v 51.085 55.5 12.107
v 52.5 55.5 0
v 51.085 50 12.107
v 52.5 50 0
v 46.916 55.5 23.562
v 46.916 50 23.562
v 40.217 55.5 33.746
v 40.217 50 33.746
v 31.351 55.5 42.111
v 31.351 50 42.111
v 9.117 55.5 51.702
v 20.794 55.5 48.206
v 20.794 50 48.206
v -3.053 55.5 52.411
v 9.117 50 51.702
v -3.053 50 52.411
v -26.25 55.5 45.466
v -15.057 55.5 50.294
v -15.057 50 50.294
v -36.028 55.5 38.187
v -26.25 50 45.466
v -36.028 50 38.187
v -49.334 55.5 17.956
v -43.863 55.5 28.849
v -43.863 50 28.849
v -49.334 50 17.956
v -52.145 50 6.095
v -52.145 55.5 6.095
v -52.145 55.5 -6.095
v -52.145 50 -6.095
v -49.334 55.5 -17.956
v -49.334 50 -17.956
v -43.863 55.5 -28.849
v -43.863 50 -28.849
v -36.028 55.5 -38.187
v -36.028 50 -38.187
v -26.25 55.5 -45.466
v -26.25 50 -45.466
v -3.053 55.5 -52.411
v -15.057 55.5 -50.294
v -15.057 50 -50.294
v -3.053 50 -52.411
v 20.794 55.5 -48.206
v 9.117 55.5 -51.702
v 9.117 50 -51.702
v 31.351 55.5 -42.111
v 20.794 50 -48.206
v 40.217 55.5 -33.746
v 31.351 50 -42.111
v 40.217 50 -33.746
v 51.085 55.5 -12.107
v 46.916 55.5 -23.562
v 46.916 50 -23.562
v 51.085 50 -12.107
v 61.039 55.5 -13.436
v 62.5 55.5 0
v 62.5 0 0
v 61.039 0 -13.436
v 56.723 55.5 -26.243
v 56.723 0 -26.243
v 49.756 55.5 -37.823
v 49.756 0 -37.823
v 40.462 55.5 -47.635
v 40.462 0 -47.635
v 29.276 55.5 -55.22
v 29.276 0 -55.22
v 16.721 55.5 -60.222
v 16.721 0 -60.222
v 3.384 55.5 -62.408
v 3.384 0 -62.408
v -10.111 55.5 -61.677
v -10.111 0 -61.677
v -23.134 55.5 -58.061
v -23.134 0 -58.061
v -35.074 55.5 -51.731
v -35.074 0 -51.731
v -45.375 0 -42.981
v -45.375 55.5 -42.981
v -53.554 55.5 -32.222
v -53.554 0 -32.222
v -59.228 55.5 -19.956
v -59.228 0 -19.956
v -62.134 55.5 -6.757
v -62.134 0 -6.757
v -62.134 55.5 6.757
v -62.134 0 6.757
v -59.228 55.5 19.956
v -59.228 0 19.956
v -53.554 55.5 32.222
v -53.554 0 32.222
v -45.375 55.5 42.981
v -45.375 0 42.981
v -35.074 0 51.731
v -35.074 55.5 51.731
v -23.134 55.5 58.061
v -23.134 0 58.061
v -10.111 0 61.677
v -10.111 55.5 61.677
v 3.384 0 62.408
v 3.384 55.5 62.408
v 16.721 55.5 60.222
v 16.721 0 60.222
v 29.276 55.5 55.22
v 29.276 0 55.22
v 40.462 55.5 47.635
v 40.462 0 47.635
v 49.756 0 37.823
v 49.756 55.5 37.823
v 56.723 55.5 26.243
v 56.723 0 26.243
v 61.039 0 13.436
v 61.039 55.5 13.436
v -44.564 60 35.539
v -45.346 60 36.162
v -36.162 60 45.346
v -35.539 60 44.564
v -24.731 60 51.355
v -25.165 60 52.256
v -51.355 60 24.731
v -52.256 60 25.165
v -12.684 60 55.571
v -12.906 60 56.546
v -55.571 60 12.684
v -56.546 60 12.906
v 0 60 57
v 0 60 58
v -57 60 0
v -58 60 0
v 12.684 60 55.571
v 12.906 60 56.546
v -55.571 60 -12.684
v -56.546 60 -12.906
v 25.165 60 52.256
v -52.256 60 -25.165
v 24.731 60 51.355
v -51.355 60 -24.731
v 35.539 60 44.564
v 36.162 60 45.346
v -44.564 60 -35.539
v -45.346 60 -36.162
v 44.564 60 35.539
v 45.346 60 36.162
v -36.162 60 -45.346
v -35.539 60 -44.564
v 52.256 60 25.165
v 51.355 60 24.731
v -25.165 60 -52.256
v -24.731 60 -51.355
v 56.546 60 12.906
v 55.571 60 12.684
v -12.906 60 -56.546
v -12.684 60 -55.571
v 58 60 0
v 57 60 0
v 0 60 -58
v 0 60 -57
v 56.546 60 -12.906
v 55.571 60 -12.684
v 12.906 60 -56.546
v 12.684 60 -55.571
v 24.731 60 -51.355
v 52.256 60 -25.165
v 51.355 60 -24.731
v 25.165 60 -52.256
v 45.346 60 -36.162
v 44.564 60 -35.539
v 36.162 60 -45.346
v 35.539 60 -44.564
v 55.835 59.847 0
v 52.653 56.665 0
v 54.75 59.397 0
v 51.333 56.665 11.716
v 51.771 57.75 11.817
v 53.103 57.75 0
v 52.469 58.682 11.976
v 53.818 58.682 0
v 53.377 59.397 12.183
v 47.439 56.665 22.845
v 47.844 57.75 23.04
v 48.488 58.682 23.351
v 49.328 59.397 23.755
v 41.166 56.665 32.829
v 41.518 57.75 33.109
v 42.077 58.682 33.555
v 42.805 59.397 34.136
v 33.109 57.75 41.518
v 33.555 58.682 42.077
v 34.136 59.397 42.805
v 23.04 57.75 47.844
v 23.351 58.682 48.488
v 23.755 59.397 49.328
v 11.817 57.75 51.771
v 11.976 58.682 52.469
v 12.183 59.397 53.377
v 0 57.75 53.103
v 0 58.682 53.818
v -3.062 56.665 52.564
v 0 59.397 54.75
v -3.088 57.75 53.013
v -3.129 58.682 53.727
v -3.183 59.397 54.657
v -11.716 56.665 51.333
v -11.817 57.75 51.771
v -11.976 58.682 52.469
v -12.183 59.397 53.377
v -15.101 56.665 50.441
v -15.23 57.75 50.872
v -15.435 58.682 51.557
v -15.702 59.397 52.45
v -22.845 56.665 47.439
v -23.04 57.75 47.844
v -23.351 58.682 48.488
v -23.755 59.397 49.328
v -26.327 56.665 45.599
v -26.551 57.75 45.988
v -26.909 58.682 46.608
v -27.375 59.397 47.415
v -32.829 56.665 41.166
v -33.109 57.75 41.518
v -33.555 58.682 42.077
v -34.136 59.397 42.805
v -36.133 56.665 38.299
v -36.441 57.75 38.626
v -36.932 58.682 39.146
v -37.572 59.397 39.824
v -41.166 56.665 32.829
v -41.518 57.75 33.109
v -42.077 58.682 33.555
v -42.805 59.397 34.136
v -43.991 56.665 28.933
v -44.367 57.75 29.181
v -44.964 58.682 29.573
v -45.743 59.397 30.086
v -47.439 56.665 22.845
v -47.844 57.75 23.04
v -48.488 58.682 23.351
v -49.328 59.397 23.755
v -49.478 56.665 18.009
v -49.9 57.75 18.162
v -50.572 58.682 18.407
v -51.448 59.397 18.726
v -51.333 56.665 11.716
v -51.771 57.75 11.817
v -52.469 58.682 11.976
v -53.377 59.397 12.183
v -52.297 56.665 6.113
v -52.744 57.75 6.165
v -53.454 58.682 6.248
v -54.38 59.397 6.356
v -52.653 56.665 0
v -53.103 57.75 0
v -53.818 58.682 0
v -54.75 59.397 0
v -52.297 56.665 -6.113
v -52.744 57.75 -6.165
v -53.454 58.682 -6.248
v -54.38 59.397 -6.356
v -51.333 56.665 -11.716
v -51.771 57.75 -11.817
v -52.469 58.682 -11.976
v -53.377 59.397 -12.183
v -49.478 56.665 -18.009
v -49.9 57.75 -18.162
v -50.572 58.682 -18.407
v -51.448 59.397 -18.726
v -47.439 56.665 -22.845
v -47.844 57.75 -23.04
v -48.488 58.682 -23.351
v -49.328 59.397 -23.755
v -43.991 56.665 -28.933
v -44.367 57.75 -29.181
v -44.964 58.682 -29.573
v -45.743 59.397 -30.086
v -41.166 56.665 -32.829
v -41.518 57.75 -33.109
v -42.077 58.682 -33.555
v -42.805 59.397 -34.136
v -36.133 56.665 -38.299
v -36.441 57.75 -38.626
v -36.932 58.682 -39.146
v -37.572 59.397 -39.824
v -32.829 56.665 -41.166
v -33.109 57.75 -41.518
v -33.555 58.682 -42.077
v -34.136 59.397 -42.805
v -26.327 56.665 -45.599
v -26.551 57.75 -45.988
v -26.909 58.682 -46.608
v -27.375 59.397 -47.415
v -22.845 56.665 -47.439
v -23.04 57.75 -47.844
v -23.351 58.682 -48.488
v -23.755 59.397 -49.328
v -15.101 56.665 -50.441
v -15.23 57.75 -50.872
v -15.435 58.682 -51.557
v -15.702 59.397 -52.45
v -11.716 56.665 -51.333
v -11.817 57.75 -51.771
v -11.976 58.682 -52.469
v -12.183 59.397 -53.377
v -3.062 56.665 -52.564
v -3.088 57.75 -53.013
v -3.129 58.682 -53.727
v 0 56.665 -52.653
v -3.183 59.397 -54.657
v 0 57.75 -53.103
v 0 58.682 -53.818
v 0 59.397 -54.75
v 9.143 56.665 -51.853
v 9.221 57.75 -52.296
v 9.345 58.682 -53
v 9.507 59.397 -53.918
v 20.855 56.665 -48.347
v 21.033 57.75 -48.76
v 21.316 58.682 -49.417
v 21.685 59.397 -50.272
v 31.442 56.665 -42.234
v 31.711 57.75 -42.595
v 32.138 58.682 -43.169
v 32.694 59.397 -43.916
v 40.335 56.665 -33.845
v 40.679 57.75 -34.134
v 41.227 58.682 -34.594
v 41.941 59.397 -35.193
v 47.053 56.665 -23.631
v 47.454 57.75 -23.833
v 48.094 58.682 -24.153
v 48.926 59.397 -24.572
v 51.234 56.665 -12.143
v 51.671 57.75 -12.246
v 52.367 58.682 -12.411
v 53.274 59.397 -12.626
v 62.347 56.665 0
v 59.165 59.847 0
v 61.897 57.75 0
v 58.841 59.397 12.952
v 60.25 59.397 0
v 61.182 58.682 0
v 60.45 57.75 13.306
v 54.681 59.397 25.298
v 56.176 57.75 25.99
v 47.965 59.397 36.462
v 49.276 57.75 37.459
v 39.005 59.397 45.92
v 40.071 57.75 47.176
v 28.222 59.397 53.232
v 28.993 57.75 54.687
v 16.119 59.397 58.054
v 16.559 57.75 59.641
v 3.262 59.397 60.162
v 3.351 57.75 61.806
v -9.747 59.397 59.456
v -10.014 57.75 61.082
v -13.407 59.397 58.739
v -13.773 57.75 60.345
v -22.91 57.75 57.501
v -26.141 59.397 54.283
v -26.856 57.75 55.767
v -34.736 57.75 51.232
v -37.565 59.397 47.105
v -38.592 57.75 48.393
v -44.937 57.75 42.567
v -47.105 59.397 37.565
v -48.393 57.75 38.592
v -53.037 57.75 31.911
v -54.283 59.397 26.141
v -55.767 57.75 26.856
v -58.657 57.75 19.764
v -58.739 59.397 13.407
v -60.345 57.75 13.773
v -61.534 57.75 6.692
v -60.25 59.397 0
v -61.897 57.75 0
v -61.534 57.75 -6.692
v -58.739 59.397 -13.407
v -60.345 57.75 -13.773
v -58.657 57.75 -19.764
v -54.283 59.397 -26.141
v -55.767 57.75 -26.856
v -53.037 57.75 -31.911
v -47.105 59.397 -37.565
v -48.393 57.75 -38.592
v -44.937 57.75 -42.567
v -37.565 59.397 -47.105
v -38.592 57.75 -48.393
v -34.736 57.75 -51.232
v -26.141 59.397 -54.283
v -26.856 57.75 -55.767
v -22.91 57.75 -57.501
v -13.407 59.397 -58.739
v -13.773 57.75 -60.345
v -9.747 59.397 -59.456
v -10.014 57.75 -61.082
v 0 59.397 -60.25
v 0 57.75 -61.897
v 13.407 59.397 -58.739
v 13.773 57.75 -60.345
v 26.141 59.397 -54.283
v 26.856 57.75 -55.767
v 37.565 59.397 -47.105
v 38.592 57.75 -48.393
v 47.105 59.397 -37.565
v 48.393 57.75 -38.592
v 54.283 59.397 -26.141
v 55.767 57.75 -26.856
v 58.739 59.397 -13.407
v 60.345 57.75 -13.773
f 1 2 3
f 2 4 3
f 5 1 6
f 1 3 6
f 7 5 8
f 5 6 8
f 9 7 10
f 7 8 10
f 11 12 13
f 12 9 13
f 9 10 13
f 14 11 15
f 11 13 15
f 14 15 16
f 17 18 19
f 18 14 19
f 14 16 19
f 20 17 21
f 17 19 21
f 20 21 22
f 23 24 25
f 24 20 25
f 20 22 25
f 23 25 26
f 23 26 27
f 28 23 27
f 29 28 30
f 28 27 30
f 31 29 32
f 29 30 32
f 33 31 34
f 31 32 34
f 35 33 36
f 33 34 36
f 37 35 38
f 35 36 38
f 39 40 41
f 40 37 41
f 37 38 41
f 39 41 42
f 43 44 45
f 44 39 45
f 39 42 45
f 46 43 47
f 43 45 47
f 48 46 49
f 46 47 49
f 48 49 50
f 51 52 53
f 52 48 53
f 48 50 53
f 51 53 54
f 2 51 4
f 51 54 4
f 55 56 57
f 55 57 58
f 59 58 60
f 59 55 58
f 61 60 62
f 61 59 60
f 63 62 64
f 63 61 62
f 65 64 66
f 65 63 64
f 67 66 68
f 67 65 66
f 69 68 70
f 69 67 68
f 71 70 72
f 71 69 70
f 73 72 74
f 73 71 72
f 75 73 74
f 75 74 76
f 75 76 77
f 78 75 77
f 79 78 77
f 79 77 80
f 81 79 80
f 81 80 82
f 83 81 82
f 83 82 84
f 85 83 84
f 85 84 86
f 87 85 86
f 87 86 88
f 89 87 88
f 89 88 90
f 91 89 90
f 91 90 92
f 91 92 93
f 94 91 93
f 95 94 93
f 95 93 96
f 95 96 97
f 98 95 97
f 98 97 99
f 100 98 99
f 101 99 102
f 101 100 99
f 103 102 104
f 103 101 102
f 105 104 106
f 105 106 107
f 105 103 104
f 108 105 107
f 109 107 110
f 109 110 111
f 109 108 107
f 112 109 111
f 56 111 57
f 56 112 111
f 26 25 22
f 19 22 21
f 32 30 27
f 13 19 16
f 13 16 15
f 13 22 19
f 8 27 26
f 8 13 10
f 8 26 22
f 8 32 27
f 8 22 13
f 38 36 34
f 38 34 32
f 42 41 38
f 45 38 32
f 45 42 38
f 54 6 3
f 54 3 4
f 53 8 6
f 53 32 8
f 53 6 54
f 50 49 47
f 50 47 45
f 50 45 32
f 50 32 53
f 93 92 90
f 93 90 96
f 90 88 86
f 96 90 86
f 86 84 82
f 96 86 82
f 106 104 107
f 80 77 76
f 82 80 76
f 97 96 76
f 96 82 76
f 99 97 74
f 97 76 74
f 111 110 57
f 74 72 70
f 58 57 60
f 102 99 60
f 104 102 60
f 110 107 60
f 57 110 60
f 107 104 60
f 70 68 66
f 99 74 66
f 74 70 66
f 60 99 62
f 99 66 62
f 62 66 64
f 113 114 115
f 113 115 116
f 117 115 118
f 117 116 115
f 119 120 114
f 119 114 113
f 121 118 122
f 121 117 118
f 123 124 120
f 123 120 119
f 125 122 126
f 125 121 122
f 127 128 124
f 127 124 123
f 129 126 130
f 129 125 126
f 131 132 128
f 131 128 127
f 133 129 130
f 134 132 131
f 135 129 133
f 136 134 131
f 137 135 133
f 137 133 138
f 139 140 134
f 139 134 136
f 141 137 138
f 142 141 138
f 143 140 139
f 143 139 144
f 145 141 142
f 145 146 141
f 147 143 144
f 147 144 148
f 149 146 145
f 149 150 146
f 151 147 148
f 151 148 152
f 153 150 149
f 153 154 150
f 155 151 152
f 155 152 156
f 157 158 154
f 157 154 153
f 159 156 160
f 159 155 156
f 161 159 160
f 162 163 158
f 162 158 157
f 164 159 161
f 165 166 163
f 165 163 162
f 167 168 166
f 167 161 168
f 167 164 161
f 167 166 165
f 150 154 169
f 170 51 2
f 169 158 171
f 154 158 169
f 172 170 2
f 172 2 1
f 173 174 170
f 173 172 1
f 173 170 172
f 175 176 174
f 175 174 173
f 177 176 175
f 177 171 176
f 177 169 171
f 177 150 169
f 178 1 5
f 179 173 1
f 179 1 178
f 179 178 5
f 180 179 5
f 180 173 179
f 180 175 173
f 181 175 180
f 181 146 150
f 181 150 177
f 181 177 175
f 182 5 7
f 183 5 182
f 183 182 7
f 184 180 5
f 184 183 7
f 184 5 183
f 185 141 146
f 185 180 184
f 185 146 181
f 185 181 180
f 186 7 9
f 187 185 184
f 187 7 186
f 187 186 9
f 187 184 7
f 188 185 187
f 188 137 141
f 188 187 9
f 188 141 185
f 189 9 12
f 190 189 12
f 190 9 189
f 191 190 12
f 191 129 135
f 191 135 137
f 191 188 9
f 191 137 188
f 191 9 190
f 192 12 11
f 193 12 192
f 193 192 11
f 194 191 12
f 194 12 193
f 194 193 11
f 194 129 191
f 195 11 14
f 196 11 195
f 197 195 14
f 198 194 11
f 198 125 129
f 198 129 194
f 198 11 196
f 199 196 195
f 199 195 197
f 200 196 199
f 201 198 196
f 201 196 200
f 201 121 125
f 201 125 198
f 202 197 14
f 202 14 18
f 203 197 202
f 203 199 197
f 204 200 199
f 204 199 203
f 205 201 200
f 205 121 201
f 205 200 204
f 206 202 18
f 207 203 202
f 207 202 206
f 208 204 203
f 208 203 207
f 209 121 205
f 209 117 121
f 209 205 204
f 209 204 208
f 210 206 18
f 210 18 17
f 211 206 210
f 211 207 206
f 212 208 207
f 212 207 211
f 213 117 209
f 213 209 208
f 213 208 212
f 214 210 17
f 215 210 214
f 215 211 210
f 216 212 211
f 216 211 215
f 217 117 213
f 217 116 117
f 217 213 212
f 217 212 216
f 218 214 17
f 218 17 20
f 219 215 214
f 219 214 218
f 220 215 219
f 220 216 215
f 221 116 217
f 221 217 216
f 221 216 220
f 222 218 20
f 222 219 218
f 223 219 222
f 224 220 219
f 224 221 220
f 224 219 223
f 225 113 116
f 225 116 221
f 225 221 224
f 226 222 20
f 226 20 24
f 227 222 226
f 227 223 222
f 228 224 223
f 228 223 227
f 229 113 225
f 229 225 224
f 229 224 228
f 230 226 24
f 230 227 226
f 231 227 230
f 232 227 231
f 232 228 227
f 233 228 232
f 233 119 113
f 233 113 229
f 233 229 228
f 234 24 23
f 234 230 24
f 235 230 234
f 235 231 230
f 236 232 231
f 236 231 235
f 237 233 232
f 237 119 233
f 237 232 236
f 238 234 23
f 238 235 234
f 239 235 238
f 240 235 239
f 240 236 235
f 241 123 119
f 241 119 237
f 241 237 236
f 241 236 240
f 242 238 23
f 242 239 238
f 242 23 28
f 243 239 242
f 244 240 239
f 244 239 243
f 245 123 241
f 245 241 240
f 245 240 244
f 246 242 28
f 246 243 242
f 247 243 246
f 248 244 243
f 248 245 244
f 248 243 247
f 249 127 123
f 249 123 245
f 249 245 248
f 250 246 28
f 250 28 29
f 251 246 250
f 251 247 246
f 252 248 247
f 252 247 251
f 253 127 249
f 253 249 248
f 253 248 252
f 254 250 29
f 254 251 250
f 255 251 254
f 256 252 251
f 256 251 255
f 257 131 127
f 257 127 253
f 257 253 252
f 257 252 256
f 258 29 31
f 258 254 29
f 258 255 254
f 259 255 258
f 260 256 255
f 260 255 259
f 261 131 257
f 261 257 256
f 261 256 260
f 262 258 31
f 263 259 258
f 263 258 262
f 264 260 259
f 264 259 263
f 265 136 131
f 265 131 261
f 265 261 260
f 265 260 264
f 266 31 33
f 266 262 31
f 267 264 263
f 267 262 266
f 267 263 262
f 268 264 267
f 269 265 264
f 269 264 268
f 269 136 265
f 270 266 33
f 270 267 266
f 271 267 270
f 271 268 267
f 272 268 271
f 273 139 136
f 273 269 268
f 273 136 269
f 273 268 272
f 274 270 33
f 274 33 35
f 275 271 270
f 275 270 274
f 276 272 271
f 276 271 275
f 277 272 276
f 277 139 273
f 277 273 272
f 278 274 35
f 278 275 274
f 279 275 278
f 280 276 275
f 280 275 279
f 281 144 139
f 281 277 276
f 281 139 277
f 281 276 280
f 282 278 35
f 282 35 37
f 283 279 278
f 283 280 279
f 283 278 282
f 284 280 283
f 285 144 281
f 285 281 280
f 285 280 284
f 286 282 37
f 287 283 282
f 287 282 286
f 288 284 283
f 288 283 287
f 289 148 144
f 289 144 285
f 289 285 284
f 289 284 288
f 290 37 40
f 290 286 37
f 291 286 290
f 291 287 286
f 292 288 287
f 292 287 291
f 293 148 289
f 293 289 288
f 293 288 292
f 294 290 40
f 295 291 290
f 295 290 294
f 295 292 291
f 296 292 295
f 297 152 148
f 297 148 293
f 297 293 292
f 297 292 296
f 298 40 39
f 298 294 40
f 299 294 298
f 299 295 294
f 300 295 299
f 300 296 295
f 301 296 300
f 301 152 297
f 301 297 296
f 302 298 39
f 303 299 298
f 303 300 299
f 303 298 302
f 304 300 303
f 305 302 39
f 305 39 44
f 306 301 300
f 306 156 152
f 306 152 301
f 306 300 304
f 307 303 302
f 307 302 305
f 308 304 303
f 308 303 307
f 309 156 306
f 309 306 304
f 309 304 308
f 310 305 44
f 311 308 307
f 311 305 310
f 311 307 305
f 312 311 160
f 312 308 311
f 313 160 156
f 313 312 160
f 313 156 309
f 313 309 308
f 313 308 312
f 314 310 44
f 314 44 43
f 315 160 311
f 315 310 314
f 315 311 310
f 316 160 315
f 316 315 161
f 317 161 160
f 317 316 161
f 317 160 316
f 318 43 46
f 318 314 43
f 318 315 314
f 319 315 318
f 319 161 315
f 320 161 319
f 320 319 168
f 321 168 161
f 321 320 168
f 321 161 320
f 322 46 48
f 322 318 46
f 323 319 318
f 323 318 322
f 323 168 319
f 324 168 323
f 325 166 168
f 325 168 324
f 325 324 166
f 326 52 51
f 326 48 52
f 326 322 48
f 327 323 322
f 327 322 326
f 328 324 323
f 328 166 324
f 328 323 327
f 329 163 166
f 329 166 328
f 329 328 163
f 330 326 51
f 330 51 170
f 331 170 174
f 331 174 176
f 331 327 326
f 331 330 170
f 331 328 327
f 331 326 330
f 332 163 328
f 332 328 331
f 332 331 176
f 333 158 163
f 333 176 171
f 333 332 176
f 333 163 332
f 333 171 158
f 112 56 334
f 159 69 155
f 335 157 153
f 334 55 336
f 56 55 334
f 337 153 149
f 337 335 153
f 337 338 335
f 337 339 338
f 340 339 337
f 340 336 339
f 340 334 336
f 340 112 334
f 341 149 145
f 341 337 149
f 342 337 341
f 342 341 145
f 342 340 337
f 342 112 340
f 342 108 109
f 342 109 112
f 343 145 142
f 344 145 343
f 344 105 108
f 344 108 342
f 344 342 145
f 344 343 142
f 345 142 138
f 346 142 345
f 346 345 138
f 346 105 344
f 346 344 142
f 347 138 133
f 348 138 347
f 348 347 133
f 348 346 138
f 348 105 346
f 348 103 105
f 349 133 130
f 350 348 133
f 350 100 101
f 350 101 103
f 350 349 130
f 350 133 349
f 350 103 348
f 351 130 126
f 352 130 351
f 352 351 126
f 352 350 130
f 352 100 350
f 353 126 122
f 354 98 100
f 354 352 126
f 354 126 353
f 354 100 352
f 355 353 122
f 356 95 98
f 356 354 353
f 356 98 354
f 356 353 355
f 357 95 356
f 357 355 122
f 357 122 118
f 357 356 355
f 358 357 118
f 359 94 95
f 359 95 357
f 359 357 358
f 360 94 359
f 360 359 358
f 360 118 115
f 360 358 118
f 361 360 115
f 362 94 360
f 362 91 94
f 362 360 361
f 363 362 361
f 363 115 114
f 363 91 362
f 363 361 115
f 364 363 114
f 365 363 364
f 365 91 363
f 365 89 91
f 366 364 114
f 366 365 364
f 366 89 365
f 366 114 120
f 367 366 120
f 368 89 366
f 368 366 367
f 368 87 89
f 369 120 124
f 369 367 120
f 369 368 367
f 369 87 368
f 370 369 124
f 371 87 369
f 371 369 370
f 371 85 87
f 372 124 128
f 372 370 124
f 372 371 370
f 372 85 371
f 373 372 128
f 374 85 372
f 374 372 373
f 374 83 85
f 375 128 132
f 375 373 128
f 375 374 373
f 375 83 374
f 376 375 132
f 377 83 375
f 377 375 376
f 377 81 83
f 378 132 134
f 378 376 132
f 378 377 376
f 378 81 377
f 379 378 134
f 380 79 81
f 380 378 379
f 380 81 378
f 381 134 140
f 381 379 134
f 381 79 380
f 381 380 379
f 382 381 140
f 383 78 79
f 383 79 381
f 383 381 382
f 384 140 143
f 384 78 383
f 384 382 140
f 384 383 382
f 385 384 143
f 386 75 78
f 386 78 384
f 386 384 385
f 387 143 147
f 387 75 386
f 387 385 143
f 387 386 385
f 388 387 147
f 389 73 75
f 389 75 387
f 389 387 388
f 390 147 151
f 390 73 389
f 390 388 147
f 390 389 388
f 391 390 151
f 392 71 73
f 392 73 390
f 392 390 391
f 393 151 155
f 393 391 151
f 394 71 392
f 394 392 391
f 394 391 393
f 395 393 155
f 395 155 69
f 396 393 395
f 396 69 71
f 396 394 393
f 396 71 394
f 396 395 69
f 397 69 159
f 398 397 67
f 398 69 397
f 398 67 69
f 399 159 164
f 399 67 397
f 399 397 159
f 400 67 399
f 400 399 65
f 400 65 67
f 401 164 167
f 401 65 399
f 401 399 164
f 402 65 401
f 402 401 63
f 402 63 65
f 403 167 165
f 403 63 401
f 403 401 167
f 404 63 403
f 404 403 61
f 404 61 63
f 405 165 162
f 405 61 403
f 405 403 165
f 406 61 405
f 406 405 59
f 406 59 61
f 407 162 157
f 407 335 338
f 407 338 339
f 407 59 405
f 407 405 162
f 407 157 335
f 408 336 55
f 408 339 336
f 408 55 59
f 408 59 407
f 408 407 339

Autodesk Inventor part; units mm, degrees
ref_plane "YZ Plane" through (0, 0, 0) normal (1, 0, 0) x (0, 1, 0)
ref_plane "XZ Plane" through (0, 0, 0) normal (0, 1, 0) x (-1, 0, 0)
ref_plane "XY Plane" through (0, 0, 0) normal (0, 0, 1) x (1, 0, 0)
sketch "Sketch1" plane through (0, 0, 0) normal (0, 0, 1) x (1, 0, 0)
  line L0 (0, 0) -> (0, 50)
  line L1 (0, 0) -> (62.5, 0)
  line L2 (62.5, 0) -> (62.5, 60)
  line L3 (62.5, 60) -> (52.5, 60)
  line L4 (52.5, 60) -> (52.5, 50)
  line L5 (52.5, 50) -> (0, 50)
  dimension "d0" = 125
  dimension "d1" = 60
  dimension "d2" = 50
  dimension "d3" = 10
revolve "Revolution1" add sketch "Sketch1" angle 360 about axis through (0, 0, 0) along (0, 1, 0)
fillet "Fillet1" radius 4.5 2 edges at (-62.5, 60, 0) (-52.5, 60, 0)
properties part number "Base"
